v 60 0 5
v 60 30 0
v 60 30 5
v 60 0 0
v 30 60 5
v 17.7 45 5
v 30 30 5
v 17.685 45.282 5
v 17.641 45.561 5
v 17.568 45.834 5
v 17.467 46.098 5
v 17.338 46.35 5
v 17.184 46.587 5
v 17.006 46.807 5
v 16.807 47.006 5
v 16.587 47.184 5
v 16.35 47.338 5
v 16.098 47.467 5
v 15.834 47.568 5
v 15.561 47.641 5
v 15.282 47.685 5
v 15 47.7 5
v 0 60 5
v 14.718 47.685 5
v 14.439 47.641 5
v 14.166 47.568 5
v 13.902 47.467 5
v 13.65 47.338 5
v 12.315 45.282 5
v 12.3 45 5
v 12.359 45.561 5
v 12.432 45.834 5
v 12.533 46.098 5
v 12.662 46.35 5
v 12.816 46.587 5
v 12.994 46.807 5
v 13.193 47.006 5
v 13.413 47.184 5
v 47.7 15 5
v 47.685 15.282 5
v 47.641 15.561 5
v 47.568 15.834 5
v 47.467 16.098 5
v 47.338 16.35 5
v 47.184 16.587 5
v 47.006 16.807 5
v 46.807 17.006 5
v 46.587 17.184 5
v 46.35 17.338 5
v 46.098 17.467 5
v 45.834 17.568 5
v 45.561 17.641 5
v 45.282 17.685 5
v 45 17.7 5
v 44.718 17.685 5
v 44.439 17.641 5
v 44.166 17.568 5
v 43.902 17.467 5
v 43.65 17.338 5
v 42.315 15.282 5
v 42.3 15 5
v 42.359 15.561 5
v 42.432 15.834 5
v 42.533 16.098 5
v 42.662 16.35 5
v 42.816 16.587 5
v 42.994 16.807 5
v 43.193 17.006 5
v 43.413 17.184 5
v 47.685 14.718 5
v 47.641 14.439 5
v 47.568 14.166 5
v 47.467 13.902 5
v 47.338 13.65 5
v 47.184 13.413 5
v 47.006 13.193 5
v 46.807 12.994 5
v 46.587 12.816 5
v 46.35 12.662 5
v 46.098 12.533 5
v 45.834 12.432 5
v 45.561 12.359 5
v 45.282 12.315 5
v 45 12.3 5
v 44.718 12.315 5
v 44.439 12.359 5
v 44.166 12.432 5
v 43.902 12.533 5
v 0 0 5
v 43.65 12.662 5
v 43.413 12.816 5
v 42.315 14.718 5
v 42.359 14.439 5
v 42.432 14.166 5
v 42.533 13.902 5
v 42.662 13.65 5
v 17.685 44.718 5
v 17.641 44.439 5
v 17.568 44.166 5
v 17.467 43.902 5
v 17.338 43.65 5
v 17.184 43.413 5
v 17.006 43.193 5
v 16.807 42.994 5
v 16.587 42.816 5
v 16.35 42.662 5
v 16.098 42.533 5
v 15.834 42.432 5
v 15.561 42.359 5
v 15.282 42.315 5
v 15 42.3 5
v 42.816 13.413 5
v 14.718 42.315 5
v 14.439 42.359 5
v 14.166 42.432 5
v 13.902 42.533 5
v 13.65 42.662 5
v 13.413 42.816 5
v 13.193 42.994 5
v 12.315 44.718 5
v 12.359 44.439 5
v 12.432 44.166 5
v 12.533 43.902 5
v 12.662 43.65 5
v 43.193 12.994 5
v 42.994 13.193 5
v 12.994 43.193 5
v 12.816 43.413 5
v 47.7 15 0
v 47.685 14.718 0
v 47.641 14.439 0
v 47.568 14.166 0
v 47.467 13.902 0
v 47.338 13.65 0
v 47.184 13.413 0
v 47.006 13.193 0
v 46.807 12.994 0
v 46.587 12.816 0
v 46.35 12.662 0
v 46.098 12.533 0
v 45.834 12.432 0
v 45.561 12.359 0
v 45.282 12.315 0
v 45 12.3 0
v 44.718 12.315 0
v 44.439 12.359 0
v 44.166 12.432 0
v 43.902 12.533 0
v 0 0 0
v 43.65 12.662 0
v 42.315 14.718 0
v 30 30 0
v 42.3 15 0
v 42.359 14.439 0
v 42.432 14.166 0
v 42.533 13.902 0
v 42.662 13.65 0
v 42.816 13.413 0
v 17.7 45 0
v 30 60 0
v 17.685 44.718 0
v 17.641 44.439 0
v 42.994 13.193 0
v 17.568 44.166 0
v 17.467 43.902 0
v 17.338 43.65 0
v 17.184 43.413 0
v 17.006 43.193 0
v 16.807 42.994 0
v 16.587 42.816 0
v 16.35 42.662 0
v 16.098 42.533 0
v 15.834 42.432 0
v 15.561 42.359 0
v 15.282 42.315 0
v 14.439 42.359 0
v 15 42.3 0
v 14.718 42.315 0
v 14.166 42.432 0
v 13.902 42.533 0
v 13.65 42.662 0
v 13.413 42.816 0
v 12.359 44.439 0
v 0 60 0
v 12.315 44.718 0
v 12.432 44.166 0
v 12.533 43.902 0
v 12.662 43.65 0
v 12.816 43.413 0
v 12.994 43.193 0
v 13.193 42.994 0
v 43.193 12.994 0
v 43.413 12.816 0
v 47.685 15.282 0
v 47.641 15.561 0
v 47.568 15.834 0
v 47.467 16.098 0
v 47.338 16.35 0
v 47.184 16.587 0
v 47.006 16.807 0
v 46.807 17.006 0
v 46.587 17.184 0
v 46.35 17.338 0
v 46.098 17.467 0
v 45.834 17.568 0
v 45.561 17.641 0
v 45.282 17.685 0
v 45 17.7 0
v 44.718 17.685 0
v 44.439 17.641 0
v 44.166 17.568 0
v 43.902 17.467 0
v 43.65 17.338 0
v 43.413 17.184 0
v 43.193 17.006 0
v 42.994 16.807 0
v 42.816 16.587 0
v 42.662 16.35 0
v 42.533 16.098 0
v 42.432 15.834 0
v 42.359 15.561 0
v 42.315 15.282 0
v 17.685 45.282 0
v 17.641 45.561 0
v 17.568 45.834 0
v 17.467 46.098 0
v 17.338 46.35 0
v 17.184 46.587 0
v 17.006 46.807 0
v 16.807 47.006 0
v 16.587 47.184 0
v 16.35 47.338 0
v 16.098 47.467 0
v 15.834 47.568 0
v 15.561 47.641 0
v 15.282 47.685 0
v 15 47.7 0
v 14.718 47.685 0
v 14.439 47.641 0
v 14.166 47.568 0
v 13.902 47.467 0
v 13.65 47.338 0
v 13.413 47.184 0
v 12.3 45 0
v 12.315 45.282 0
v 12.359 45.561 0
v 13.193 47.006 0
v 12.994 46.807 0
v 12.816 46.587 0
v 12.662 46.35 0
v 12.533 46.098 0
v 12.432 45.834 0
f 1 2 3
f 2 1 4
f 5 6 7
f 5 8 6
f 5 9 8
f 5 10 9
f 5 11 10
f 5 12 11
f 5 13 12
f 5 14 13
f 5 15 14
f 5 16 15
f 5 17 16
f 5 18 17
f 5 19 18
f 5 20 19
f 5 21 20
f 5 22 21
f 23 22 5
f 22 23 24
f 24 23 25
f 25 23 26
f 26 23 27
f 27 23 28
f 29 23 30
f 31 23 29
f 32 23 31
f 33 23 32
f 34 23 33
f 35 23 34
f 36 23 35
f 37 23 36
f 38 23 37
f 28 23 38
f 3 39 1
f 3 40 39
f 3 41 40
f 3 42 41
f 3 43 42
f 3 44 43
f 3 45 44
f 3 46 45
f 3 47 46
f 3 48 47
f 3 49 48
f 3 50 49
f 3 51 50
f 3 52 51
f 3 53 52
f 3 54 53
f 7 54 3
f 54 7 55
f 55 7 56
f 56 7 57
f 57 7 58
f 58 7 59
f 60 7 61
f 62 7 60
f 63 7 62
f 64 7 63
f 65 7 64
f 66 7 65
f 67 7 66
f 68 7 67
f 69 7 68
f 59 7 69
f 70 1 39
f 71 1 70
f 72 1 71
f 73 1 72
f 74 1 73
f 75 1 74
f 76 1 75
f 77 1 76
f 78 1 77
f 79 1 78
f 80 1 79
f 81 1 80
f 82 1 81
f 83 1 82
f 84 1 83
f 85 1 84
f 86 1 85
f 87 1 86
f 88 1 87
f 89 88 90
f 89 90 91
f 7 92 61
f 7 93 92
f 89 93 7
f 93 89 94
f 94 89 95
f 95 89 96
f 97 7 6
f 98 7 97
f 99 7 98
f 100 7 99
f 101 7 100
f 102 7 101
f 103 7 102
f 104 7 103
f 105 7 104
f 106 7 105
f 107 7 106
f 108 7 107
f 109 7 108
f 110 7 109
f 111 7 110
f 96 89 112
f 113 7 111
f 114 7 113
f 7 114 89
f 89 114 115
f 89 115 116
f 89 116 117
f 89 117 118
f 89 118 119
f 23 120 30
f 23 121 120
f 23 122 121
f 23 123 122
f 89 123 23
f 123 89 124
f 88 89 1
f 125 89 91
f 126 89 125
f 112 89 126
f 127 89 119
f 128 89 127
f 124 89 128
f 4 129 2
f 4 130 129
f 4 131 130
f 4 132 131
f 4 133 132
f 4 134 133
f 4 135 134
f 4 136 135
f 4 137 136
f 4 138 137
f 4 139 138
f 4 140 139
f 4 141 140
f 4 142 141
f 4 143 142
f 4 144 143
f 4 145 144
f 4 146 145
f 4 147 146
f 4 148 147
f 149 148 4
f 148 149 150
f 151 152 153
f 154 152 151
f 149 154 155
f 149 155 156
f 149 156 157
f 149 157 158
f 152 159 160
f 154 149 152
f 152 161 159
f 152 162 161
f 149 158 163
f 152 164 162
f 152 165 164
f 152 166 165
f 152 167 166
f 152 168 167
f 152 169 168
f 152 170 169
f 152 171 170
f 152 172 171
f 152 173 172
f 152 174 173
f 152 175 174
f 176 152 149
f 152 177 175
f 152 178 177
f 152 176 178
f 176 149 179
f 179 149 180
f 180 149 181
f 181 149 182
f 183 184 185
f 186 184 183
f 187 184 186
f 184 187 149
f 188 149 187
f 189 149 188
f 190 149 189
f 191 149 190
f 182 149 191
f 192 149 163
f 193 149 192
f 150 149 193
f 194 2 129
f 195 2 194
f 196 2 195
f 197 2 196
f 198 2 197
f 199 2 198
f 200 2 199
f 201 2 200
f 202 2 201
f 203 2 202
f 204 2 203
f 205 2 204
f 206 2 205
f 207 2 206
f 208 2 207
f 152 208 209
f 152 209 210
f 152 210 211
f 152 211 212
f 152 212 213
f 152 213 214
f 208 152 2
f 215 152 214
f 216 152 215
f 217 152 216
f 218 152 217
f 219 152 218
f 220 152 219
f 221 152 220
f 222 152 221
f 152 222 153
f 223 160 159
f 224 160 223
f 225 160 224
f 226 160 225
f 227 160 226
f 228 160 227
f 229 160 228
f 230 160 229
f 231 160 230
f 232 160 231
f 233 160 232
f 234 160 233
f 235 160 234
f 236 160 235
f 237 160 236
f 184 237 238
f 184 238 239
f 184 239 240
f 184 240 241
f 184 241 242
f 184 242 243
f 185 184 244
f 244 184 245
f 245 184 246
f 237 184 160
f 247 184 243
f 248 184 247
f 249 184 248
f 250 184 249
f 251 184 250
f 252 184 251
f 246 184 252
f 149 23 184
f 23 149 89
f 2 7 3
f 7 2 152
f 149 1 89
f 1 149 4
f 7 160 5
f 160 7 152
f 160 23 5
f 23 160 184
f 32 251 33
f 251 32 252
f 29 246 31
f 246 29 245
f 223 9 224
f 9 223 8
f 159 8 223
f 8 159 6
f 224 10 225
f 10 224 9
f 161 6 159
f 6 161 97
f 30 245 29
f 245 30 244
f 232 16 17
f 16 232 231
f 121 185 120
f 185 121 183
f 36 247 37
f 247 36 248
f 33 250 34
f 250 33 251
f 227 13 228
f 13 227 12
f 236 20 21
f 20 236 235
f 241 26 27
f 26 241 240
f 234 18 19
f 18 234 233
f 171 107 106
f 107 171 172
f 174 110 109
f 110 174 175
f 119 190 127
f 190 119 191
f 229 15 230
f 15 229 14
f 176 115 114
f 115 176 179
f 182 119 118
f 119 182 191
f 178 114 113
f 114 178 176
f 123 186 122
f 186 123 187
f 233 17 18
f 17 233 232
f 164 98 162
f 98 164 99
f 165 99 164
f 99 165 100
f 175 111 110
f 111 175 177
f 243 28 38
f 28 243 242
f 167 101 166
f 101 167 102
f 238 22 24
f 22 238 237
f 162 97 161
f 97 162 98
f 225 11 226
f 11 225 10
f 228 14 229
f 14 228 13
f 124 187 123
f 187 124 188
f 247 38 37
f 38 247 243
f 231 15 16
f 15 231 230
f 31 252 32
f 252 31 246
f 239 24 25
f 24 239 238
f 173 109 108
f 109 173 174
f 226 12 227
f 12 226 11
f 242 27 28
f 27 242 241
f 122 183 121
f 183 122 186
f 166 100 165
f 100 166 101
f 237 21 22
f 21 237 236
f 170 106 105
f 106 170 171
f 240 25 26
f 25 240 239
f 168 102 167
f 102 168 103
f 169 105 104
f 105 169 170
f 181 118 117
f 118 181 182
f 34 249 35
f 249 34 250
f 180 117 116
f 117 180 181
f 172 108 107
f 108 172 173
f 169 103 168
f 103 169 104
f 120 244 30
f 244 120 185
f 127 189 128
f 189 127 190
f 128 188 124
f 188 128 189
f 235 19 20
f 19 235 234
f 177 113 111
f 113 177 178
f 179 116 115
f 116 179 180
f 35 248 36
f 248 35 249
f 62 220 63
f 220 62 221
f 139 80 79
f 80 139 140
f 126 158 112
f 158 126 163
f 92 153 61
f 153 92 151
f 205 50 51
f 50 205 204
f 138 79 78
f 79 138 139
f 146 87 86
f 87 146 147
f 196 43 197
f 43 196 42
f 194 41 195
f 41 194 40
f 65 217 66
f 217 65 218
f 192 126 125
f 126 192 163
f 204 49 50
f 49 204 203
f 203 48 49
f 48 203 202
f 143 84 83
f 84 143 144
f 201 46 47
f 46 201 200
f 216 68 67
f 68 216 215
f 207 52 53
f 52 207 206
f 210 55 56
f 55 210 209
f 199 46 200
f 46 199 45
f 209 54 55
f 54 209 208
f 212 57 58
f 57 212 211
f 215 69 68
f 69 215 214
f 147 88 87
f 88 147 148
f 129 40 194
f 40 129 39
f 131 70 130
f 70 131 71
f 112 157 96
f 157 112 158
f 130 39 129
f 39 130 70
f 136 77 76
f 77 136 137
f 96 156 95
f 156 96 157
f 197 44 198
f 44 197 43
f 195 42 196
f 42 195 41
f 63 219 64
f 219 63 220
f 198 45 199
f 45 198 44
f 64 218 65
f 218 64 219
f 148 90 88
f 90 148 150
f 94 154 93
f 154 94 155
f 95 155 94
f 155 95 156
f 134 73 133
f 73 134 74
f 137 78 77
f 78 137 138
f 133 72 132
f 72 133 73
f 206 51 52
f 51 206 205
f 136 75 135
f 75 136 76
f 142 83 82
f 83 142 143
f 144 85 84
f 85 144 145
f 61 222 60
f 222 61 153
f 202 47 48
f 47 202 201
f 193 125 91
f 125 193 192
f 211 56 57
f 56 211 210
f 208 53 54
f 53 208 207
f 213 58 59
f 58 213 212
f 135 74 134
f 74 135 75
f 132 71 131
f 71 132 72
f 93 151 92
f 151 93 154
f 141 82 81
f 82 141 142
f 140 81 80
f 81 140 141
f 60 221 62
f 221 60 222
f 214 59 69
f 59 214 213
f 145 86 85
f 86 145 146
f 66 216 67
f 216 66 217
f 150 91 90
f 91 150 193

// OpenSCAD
// V-slot corner connector.
$fn = 60;
eps = 0.02;
profile = 30;
arm = 60;
plate_t = 5;
difference() {
    union() { cube([arm,profile,plate_t]); cube([profile,arm,plate_t]); }
    for (p=[[profile/2,arm-profile/2],[arm-profile/2,profile/2]]) translate([p[0],p[1],-eps]) cylinder(d=5.4,h=plate_t+2*eps);
}
